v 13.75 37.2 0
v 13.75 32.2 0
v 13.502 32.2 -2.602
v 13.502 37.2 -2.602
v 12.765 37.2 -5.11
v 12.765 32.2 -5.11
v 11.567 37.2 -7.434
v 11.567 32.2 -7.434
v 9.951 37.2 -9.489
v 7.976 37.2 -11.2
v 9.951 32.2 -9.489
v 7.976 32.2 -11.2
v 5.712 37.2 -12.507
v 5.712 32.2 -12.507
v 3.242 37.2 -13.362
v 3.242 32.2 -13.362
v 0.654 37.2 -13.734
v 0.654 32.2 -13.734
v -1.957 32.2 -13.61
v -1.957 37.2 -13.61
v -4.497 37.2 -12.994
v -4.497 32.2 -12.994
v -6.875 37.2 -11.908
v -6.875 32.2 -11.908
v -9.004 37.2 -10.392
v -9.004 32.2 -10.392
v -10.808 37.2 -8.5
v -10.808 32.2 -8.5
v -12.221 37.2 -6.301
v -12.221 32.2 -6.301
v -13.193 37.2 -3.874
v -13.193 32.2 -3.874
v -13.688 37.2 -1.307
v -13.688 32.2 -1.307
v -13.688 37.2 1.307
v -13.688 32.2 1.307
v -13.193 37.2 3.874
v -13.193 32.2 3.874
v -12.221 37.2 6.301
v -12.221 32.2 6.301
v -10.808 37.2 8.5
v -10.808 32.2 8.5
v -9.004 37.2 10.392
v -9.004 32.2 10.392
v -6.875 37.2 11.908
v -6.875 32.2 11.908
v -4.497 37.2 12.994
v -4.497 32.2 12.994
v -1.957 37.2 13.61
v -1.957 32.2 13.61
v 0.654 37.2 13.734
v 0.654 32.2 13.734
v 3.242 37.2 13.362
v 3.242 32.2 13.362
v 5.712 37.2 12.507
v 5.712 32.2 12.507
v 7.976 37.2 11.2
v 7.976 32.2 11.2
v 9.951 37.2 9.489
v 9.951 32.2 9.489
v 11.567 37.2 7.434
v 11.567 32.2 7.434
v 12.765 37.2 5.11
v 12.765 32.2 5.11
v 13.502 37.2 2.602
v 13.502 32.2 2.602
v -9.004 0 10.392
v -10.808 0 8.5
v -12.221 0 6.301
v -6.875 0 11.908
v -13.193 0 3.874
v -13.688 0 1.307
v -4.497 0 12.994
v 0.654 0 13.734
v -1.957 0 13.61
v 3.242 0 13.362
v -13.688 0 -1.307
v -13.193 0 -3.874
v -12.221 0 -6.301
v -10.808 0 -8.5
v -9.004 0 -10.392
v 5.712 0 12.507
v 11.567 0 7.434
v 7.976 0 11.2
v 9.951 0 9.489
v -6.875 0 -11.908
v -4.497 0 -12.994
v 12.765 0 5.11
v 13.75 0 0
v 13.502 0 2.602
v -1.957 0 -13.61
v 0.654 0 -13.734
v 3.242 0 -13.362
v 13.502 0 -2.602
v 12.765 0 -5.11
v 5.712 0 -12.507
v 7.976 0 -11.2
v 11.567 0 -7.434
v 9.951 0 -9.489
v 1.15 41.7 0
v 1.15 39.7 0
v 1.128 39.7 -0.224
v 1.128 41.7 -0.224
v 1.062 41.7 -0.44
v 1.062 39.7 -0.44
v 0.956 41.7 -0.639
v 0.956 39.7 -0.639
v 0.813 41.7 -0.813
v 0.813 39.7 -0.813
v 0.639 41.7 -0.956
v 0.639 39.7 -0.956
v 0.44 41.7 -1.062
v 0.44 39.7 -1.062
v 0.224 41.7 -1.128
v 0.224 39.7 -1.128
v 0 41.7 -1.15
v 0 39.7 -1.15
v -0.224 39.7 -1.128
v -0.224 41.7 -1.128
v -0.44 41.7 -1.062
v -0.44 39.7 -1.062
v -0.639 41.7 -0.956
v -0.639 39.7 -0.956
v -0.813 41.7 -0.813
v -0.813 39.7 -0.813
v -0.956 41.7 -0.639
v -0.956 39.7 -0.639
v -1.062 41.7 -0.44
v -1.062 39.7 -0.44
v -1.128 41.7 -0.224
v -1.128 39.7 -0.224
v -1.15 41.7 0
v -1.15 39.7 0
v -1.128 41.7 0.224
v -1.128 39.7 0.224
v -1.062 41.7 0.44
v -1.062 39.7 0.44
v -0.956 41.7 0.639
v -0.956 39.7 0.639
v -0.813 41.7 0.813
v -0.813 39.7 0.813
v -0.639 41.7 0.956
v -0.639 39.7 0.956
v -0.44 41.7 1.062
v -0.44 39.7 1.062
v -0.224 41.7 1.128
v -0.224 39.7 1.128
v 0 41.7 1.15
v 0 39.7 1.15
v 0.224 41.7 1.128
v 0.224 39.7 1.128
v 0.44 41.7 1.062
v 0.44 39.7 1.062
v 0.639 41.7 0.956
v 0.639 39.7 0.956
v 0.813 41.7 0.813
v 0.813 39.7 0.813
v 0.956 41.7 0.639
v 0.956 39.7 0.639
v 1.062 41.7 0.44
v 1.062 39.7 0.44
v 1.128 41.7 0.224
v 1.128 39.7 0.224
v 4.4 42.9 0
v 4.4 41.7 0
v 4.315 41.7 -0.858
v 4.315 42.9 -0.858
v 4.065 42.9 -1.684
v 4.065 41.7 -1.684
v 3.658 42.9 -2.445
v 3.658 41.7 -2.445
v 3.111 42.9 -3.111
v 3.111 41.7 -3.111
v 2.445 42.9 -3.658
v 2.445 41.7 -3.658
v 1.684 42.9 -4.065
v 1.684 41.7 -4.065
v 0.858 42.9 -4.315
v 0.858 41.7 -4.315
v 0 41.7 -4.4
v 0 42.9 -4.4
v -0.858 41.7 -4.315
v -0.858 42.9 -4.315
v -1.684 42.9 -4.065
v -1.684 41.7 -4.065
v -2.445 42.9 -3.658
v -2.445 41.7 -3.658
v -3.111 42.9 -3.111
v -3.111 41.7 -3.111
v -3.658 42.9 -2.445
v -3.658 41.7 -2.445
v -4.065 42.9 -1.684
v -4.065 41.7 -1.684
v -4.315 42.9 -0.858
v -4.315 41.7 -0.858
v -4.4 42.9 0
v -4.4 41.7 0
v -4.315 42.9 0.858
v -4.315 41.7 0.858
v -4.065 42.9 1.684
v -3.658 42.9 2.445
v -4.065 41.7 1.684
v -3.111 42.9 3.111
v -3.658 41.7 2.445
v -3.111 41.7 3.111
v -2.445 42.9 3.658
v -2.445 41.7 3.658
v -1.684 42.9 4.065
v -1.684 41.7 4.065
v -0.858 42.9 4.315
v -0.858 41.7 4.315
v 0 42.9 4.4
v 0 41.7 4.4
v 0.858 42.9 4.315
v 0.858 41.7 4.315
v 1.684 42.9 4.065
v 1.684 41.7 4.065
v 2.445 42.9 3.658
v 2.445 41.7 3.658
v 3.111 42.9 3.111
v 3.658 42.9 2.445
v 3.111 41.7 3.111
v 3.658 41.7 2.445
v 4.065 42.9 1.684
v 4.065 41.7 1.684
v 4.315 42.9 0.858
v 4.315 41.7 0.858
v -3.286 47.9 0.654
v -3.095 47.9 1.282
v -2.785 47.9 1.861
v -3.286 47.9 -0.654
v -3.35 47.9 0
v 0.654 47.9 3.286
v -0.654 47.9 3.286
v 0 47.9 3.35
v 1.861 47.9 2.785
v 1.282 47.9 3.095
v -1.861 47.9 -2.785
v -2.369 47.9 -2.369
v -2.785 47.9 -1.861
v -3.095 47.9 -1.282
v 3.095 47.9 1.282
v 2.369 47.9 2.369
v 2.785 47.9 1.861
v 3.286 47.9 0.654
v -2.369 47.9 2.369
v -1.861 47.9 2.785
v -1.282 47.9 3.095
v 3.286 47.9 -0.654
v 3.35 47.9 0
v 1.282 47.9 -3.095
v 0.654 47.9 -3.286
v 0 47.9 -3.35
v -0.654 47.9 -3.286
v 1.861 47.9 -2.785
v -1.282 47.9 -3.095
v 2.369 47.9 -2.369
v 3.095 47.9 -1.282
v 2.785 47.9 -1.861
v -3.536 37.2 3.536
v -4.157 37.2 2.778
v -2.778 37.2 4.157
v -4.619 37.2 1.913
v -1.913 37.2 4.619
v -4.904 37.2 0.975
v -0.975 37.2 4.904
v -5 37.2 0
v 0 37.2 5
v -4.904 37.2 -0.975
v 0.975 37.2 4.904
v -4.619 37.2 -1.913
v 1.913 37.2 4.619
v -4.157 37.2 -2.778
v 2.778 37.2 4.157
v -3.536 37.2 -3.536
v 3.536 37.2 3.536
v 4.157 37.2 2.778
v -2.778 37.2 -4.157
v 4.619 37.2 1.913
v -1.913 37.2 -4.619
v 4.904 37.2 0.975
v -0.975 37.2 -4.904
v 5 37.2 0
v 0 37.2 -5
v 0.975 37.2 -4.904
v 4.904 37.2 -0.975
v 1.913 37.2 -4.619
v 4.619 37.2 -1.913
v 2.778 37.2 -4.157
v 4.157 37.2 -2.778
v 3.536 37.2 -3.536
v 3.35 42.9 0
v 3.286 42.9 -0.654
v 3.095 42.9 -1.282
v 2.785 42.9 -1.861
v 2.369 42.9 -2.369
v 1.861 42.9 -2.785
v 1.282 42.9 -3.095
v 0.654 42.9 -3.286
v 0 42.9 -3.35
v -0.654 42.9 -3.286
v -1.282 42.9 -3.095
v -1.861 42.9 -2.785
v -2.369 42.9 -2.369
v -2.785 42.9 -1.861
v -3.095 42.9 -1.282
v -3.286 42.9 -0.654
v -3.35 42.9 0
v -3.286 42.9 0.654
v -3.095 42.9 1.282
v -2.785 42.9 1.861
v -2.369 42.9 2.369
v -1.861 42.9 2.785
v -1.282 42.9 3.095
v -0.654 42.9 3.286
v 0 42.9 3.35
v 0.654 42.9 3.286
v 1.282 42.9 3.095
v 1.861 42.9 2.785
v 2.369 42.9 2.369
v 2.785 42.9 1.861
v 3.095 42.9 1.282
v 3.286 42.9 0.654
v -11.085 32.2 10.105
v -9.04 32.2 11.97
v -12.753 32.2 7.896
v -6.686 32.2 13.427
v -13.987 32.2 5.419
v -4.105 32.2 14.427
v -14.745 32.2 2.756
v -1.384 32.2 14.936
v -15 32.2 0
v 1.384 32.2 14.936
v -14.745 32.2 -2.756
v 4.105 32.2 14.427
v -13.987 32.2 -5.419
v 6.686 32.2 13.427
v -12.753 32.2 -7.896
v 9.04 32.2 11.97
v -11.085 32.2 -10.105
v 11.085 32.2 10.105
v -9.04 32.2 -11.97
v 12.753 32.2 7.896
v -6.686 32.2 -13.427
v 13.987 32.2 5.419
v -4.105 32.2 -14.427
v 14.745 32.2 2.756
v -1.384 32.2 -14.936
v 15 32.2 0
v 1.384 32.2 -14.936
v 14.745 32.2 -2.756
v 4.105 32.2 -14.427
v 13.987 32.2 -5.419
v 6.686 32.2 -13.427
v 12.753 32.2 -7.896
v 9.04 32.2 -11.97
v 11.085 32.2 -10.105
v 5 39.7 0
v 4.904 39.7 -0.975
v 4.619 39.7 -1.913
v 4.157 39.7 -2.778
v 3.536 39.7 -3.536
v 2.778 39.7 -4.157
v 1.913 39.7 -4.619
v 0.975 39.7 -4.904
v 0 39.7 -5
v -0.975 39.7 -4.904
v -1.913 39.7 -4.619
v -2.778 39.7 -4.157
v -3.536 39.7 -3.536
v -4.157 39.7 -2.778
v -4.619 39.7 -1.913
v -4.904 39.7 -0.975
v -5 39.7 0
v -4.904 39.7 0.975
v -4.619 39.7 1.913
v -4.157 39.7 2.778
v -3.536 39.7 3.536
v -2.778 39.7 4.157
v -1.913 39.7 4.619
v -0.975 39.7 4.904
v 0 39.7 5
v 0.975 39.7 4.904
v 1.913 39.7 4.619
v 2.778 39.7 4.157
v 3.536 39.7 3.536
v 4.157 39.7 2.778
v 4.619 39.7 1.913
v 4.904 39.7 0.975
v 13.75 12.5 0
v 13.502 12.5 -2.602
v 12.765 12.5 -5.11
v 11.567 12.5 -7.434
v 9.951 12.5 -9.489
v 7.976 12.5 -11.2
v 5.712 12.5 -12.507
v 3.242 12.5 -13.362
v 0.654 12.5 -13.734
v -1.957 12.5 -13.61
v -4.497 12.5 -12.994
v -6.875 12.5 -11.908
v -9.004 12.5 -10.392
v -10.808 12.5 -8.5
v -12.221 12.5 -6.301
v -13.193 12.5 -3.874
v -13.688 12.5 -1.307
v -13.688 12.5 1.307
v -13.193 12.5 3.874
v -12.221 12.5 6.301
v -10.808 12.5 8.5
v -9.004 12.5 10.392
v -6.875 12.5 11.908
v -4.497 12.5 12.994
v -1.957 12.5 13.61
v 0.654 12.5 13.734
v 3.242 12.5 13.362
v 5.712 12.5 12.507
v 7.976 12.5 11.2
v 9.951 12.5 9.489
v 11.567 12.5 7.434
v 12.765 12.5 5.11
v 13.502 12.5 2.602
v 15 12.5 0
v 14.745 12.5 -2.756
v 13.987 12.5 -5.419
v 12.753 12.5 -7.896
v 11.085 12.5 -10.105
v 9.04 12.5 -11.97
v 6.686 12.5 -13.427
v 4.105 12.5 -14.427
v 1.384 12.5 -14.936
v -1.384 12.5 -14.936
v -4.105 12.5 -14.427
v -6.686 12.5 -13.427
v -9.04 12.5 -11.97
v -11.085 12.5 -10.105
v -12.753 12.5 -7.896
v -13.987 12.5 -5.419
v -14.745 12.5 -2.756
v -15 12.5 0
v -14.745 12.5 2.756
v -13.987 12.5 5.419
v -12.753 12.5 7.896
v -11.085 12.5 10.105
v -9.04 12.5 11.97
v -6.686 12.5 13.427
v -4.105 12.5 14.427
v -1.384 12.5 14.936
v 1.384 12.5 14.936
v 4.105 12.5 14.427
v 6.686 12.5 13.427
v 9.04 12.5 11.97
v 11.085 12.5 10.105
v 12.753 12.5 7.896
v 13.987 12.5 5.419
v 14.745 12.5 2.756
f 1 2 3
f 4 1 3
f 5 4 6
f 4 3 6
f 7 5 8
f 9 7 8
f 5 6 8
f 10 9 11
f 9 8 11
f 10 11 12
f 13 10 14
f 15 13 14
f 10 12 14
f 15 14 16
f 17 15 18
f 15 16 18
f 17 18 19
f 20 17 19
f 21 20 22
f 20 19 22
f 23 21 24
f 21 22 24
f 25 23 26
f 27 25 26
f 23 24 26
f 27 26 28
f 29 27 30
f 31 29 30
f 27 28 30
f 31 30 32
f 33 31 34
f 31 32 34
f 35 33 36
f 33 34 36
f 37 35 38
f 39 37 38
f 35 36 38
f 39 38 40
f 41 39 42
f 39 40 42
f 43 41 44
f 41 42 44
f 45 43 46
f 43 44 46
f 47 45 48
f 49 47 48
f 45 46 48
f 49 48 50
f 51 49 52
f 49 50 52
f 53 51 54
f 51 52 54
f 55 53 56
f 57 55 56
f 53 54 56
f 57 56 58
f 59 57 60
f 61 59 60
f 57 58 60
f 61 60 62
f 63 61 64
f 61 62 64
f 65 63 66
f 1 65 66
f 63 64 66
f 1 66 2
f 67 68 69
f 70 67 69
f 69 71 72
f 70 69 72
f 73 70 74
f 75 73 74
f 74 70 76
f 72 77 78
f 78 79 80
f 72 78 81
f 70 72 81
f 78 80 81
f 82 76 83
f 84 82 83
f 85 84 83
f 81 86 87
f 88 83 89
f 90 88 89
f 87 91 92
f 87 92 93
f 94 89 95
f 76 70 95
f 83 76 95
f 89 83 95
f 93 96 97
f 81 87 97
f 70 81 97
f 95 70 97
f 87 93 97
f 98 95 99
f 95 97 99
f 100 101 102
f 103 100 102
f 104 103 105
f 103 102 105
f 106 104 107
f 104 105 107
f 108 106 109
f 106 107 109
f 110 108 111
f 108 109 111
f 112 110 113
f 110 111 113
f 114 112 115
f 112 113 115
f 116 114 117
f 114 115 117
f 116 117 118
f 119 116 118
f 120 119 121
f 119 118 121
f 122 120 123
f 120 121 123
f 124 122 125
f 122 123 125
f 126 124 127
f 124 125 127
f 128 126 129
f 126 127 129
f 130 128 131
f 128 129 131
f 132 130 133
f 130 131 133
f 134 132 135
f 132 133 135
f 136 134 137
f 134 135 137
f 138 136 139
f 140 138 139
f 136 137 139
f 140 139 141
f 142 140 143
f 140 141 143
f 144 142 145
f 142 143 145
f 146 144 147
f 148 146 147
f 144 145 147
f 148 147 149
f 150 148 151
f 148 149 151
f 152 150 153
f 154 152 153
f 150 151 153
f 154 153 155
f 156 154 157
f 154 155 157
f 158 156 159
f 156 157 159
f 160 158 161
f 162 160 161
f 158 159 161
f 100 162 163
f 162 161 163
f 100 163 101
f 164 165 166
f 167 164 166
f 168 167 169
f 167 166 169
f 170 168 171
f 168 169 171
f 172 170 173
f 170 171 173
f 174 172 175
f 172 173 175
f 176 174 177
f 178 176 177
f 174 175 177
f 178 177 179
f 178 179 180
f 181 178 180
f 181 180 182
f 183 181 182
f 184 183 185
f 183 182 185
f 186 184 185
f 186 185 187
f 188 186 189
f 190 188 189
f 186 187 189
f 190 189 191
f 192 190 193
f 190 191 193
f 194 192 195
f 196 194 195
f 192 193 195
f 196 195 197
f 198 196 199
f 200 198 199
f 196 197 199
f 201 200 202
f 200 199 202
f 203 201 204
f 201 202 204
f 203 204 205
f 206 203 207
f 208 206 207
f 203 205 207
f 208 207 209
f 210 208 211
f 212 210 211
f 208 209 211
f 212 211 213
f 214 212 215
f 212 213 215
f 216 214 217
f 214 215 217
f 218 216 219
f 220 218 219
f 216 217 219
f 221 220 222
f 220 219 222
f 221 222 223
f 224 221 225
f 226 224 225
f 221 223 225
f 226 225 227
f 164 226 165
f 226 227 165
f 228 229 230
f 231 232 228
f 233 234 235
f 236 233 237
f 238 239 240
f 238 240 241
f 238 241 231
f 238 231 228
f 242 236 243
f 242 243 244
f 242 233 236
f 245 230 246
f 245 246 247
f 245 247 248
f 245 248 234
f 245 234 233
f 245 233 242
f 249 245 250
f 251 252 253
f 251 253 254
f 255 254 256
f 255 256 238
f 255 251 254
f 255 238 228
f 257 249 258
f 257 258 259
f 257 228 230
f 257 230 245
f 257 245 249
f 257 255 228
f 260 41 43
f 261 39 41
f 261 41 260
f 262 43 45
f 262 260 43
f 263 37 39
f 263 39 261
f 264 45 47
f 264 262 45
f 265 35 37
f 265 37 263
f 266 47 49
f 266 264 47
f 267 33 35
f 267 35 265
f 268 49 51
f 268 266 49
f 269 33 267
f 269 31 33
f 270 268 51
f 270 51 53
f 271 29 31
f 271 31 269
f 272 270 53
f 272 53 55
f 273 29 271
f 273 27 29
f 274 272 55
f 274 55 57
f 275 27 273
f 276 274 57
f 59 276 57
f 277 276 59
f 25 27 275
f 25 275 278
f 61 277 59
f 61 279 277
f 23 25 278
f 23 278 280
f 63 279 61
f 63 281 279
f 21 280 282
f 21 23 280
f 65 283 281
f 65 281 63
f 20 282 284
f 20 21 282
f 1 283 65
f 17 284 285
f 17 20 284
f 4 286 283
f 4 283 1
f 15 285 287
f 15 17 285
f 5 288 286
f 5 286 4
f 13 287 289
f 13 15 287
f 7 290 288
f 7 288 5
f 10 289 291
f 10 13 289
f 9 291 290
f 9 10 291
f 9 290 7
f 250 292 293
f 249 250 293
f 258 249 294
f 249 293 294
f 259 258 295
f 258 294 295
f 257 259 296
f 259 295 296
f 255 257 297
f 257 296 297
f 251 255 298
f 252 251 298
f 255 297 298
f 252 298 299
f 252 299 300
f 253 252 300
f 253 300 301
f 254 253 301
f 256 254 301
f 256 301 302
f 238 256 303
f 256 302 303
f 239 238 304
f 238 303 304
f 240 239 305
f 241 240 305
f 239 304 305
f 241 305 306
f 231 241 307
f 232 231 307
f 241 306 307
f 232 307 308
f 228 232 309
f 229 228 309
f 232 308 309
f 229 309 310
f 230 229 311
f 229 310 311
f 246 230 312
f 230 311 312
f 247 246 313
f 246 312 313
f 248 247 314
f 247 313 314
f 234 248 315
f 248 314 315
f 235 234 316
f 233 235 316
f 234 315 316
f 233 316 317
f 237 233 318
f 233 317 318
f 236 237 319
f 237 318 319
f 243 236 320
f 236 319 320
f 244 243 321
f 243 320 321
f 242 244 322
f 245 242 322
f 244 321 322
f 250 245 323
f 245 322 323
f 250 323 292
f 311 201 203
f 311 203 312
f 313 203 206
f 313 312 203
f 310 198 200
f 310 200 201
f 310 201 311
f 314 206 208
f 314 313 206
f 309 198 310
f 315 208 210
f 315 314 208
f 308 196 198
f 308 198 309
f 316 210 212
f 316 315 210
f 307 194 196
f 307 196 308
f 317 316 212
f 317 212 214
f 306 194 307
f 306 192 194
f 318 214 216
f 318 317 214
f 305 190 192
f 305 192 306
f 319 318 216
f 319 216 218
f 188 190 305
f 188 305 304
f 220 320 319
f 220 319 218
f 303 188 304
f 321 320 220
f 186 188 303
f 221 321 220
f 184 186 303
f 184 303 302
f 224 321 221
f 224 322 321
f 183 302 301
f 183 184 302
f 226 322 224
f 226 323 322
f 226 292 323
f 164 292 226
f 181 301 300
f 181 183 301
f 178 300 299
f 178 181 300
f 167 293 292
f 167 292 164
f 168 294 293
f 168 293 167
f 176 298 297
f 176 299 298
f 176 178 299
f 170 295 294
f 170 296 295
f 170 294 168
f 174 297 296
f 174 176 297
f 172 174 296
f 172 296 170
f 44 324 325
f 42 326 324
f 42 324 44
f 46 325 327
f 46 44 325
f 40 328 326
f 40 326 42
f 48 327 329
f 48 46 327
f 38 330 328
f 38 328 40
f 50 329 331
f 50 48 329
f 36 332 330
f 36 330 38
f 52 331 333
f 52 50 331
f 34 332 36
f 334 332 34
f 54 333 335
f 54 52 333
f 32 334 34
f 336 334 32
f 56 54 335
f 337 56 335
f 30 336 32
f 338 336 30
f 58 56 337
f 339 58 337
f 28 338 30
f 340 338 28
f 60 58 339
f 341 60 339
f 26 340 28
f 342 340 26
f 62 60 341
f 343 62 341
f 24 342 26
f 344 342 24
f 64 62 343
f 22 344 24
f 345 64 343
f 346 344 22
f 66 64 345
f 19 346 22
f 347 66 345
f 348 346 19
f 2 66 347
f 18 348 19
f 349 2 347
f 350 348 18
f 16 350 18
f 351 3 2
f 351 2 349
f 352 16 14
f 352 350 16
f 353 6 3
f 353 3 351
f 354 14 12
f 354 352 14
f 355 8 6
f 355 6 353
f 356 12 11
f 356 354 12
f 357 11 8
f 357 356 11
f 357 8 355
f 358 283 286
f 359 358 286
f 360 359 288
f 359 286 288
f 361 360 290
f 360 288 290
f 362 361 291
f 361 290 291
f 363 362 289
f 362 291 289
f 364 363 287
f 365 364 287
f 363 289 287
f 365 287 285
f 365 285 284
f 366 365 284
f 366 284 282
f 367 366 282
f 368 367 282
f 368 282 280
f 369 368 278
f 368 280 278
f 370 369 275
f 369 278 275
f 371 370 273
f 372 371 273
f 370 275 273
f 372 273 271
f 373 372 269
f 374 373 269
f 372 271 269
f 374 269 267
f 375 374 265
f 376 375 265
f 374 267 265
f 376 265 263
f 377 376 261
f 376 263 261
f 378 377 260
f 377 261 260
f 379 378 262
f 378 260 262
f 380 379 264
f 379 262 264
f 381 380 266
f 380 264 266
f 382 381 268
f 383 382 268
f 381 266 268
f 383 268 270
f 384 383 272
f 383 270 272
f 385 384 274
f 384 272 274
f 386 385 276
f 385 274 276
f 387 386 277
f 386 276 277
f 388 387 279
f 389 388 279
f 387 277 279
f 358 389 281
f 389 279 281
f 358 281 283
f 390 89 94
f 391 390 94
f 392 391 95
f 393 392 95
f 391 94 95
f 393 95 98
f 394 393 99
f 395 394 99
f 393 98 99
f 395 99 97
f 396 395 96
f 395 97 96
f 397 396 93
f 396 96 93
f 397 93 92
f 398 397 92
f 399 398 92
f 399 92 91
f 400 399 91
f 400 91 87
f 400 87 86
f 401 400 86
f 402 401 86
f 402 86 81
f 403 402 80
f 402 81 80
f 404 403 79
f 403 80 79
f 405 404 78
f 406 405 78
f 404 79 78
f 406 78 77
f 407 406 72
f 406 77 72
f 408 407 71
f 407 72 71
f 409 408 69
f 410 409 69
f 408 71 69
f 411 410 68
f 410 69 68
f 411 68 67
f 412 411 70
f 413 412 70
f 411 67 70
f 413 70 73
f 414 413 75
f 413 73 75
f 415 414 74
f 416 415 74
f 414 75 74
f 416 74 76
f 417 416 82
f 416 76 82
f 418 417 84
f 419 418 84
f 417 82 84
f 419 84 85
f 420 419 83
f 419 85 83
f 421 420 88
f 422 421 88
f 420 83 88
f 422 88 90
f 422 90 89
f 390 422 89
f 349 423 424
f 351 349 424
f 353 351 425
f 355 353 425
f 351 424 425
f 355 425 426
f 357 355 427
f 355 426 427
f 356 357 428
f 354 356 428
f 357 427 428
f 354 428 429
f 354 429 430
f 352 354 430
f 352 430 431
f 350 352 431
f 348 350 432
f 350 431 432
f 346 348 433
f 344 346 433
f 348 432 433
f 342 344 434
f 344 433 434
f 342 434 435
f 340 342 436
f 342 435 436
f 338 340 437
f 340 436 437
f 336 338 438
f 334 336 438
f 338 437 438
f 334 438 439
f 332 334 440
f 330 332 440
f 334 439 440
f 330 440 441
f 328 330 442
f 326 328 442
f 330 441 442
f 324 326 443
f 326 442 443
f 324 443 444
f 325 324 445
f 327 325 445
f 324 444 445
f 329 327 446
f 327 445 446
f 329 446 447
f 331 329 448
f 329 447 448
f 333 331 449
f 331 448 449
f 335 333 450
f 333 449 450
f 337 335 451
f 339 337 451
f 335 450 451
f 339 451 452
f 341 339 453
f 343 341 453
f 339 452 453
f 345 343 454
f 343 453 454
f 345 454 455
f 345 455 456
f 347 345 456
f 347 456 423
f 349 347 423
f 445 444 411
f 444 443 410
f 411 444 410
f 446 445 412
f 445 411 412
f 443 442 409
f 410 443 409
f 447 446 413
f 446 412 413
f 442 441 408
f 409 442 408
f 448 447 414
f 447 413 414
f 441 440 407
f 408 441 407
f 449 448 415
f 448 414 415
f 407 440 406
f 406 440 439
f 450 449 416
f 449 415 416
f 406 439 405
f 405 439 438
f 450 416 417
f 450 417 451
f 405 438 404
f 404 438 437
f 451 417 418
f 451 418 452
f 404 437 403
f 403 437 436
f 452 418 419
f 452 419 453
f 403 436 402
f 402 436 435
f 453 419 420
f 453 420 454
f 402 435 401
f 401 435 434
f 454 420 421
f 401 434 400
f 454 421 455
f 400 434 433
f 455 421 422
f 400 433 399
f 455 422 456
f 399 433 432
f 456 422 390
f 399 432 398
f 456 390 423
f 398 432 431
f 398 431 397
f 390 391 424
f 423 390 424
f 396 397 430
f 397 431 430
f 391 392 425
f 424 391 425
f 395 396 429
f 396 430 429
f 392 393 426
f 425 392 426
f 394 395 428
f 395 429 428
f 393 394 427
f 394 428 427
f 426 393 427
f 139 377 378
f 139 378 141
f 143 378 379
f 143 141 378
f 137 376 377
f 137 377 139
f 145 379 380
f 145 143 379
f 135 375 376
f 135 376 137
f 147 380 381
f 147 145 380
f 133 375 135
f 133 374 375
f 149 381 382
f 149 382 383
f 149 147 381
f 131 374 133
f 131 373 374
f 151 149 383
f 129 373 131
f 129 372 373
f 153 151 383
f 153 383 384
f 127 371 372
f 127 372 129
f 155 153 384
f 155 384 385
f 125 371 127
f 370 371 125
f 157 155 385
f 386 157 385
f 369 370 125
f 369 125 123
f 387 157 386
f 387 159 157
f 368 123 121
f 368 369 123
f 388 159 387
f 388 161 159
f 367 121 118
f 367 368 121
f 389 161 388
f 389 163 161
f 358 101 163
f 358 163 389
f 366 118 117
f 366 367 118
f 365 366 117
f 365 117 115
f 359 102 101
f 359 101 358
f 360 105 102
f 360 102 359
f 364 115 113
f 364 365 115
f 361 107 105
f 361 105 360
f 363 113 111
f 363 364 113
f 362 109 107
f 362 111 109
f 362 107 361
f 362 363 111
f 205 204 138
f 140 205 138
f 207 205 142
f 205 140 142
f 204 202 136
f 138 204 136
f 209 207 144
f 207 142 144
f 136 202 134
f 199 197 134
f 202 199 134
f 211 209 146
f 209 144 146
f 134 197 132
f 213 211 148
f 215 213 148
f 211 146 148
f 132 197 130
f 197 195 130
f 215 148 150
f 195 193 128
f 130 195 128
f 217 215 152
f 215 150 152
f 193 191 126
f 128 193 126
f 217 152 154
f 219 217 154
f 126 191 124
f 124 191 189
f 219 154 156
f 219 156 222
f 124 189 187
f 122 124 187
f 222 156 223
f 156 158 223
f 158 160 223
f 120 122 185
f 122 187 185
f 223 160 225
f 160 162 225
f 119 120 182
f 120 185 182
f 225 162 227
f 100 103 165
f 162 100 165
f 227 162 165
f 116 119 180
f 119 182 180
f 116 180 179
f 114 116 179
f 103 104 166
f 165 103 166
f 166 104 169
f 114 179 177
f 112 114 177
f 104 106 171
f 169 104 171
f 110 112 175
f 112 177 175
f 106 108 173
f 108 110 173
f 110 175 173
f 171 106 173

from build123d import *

# Parameters (mm, degrees)
CROQUIS1_R              = 13.75
SALIENTE_EXTRUIR1_DEPTH = 12.5
CROQUIS2_R              = 15
SALIENTE_EXTRUIR2_DEPTH = 19.7
CROQUIS3_R              = 13.75
SALIENTE_EXTRUIR3_DEPTH = 5
CROQUIS4_R              = 5
SALIENTE_EXTRUIR4_DEPTH = 2.5
CROQUIS5_R              = 1.15
SALIENTE_EXTRUIR5_DEPTH = 2
CROQUIS6_R              = 4.4
SALIENTE_EXTRUIR6_DEPTH = 1.2
CROQUIS7_R              = 3.35
SALIENTE_EXTRUIR7_DEPTH = 5


with BuildPart() as part:
    # Croquis1 → Saliente-Extruir1 (new body)
    with BuildSketch(Plane(origin=(0, 0, 0), x_dir=(1, 0, 0), z_dir=(0, 1, 0))):
        Circle(CROQUIS1_R)
    extrude(amount=SALIENTE_EXTRUIR1_DEPTH)

    # Croquis2 → Saliente-Extruir2 (add)
    with BuildSketch(Plane(origin=(0, 12.5, 0), x_dir=(1, 0, 0), z_dir=(0, 1, 0))):
        Circle(CROQUIS2_R)
    extrude(amount=SALIENTE_EXTRUIR2_DEPTH)

    # Croquis3 → Saliente-Extruir3 (add)
    with BuildSketch(Plane(origin=(0, 32.2, 0), x_dir=(1, 0, 0), z_dir=(0, 1, 0))):
        Circle(CROQUIS3_R)
    extrude(amount=SALIENTE_EXTRUIR3_DEPTH)

    # Croquis4 → Saliente-Extruir4 (add)
    with BuildSketch(Plane(origin=(0, 37.2, 0), x_dir=(1, 0, 0), z_dir=(0, 1, 0))):
        Circle(CROQUIS4_R)
    extrude(amount=SALIENTE_EXTRUIR4_DEPTH)

    # Croquis5 → Saliente-Extruir5 (add)
    with BuildSketch(Plane(origin=(0, 39.7, 0), x_dir=(1, 0, 0), z_dir=(0, 1, 0))):
        Circle(CROQUIS5_R)
    extrude(amount=SALIENTE_EXTRUIR5_DEPTH)

    # Croquis6 → Saliente-Extruir6 (add)
    with BuildSketch(Plane(origin=(0, 41.7, 0), x_dir=(1, 0, 0), z_dir=(0, 1, 0))):
        Circle(CROQUIS6_R)
    extrude(amount=SALIENTE_EXTRUIR6_DEPTH)

    # Croquis7 → Saliente-Extruir7 (add)
    with BuildSketch(Plane(origin=(0, 42.9, 0), x_dir=(1, 0, 0), z_dir=(0, 1, 0))):
        Circle(CROQUIS7_R)
    extrude(amount=SALIENTE_EXTRUIR7_DEPTH)


solid = part.part
